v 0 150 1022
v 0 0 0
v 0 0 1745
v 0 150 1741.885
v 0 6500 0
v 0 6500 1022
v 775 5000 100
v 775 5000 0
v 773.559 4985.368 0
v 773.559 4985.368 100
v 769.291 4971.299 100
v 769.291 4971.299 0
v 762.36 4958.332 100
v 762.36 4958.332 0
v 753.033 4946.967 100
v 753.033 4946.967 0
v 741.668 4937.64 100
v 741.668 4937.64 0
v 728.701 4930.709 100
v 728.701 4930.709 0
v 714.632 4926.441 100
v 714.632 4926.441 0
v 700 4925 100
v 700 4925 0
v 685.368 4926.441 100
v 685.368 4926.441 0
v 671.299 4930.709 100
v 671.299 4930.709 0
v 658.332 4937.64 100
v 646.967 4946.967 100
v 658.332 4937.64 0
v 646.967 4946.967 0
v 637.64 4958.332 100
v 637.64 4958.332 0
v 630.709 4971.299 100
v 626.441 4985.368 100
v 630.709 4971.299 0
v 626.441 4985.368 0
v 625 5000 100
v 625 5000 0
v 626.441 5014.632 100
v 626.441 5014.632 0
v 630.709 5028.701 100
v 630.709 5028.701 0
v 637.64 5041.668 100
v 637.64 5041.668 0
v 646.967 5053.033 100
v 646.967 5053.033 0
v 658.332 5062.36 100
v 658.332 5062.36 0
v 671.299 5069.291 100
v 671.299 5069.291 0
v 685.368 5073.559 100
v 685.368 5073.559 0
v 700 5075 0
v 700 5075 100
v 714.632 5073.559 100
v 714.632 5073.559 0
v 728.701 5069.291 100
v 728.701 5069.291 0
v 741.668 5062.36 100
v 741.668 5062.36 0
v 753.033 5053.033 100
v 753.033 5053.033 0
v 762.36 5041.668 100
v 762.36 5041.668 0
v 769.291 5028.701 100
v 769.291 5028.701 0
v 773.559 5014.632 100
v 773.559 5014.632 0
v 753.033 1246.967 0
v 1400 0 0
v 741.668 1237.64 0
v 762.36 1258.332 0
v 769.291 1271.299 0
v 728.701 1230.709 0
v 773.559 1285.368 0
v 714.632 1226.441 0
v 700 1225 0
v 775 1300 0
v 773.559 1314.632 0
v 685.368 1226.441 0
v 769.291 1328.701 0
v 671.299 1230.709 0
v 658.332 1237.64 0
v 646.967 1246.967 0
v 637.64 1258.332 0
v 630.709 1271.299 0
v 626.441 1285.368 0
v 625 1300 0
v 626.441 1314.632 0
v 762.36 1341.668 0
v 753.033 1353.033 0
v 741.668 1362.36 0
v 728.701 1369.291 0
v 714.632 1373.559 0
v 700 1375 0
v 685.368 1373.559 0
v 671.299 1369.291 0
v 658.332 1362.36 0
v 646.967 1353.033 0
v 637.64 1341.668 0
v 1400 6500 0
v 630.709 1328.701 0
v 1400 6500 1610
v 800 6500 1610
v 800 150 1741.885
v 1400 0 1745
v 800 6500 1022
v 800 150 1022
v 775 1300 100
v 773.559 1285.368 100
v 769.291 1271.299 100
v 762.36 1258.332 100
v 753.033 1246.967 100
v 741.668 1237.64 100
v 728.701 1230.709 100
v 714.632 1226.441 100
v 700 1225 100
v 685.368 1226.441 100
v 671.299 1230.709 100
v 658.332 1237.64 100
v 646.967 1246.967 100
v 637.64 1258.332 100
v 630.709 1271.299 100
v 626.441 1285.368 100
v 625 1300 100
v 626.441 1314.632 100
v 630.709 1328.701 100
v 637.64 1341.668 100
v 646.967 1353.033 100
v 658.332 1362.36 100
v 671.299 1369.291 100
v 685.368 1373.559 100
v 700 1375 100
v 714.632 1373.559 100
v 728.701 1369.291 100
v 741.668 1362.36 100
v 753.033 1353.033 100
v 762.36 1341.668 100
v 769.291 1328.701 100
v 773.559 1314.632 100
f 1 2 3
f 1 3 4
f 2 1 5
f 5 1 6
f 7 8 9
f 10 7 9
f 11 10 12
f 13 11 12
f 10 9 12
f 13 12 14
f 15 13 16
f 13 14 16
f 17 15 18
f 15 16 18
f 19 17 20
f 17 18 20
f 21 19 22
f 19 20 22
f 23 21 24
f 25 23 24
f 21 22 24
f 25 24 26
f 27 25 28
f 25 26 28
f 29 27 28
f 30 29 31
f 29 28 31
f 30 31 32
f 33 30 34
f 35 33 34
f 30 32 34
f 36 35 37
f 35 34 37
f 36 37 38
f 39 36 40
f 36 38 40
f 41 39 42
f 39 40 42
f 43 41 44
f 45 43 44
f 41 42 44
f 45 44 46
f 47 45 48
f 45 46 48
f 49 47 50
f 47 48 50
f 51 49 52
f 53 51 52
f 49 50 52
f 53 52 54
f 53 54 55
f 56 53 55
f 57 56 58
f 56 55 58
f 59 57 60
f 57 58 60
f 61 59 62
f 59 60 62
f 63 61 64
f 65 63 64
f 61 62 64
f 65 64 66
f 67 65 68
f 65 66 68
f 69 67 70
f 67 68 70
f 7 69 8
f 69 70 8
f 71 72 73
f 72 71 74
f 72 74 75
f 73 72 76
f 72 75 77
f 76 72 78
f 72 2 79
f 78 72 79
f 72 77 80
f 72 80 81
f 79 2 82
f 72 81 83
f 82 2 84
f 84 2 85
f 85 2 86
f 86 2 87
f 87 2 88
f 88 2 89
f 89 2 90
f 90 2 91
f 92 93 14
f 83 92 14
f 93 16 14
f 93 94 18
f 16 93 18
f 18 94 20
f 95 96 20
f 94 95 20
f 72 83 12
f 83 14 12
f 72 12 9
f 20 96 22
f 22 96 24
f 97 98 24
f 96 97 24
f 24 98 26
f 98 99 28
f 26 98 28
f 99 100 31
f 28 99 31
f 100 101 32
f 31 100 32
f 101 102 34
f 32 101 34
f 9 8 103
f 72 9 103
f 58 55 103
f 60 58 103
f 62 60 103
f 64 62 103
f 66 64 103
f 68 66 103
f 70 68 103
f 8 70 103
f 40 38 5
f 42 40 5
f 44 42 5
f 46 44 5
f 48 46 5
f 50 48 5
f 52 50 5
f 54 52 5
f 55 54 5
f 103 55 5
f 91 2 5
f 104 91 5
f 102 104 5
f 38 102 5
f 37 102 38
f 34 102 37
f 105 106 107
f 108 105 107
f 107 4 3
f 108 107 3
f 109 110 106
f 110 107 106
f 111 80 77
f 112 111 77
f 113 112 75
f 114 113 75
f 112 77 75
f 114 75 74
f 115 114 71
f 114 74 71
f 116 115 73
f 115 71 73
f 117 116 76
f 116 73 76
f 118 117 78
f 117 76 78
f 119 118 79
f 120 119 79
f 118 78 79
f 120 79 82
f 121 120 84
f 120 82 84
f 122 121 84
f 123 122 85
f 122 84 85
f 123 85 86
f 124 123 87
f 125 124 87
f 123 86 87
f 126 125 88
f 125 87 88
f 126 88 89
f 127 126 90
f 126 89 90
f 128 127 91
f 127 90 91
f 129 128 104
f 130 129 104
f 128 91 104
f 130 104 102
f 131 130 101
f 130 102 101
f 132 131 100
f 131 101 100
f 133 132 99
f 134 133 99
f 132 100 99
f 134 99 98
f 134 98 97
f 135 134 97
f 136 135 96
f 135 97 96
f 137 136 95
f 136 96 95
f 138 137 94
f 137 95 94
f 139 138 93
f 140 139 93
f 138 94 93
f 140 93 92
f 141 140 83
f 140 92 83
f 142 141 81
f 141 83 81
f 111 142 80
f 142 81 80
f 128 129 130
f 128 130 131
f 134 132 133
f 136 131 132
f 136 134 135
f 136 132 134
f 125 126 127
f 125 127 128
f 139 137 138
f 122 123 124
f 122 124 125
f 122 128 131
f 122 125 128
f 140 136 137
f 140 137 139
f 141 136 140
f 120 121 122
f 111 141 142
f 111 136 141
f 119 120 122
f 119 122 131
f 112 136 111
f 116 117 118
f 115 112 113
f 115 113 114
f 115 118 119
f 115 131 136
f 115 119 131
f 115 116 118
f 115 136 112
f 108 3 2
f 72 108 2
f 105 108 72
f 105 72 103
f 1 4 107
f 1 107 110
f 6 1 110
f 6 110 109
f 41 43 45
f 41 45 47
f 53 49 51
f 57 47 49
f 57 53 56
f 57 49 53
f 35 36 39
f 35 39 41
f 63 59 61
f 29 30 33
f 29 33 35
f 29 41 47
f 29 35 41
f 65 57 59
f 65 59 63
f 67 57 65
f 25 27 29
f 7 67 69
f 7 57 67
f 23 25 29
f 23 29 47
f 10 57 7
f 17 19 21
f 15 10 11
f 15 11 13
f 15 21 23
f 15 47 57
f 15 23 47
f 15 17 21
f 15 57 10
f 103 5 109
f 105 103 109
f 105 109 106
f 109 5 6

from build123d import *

# Parameters (mm, degrees)
F1_DEPTH = 1400
F3_DEPTH = 800
F4_R     = 75
F5_DEPTH = 100


with BuildPart() as f1:
    # F0 (on Right) → F1 (new body)
    with BuildSketch(Plane.YZ):
        Polygon((0, 1745), (0, 0), (6500, 0), (6500, 1610), align=None)
    extrude(amount=F1_DEPTH)

    # F2 (on Right) → F3 (cut)
    with BuildSketch(Plane.YZ):
        Polygon((150, 1022), (6500, 1022), (6500, 1610), (150, 1741.8846153846), align=None)
    extrude(amount=F3_DEPTH, mode=Mode.SUBTRACT)

    # F4 (on face) → F5 (cut)
    with BuildSketch(Plane(origin=(0, 0, 0), x_dir=(1, 0, 0), z_dir=(0, 0, -1))):
        with Locations((700, -1300)):
            Circle(F4_R)
        with Locations((700, -5000)):
            Circle(F4_R)
    extrude(amount=-F5_DEPTH, mode=Mode.SUBTRACT)


solid = f1.part
